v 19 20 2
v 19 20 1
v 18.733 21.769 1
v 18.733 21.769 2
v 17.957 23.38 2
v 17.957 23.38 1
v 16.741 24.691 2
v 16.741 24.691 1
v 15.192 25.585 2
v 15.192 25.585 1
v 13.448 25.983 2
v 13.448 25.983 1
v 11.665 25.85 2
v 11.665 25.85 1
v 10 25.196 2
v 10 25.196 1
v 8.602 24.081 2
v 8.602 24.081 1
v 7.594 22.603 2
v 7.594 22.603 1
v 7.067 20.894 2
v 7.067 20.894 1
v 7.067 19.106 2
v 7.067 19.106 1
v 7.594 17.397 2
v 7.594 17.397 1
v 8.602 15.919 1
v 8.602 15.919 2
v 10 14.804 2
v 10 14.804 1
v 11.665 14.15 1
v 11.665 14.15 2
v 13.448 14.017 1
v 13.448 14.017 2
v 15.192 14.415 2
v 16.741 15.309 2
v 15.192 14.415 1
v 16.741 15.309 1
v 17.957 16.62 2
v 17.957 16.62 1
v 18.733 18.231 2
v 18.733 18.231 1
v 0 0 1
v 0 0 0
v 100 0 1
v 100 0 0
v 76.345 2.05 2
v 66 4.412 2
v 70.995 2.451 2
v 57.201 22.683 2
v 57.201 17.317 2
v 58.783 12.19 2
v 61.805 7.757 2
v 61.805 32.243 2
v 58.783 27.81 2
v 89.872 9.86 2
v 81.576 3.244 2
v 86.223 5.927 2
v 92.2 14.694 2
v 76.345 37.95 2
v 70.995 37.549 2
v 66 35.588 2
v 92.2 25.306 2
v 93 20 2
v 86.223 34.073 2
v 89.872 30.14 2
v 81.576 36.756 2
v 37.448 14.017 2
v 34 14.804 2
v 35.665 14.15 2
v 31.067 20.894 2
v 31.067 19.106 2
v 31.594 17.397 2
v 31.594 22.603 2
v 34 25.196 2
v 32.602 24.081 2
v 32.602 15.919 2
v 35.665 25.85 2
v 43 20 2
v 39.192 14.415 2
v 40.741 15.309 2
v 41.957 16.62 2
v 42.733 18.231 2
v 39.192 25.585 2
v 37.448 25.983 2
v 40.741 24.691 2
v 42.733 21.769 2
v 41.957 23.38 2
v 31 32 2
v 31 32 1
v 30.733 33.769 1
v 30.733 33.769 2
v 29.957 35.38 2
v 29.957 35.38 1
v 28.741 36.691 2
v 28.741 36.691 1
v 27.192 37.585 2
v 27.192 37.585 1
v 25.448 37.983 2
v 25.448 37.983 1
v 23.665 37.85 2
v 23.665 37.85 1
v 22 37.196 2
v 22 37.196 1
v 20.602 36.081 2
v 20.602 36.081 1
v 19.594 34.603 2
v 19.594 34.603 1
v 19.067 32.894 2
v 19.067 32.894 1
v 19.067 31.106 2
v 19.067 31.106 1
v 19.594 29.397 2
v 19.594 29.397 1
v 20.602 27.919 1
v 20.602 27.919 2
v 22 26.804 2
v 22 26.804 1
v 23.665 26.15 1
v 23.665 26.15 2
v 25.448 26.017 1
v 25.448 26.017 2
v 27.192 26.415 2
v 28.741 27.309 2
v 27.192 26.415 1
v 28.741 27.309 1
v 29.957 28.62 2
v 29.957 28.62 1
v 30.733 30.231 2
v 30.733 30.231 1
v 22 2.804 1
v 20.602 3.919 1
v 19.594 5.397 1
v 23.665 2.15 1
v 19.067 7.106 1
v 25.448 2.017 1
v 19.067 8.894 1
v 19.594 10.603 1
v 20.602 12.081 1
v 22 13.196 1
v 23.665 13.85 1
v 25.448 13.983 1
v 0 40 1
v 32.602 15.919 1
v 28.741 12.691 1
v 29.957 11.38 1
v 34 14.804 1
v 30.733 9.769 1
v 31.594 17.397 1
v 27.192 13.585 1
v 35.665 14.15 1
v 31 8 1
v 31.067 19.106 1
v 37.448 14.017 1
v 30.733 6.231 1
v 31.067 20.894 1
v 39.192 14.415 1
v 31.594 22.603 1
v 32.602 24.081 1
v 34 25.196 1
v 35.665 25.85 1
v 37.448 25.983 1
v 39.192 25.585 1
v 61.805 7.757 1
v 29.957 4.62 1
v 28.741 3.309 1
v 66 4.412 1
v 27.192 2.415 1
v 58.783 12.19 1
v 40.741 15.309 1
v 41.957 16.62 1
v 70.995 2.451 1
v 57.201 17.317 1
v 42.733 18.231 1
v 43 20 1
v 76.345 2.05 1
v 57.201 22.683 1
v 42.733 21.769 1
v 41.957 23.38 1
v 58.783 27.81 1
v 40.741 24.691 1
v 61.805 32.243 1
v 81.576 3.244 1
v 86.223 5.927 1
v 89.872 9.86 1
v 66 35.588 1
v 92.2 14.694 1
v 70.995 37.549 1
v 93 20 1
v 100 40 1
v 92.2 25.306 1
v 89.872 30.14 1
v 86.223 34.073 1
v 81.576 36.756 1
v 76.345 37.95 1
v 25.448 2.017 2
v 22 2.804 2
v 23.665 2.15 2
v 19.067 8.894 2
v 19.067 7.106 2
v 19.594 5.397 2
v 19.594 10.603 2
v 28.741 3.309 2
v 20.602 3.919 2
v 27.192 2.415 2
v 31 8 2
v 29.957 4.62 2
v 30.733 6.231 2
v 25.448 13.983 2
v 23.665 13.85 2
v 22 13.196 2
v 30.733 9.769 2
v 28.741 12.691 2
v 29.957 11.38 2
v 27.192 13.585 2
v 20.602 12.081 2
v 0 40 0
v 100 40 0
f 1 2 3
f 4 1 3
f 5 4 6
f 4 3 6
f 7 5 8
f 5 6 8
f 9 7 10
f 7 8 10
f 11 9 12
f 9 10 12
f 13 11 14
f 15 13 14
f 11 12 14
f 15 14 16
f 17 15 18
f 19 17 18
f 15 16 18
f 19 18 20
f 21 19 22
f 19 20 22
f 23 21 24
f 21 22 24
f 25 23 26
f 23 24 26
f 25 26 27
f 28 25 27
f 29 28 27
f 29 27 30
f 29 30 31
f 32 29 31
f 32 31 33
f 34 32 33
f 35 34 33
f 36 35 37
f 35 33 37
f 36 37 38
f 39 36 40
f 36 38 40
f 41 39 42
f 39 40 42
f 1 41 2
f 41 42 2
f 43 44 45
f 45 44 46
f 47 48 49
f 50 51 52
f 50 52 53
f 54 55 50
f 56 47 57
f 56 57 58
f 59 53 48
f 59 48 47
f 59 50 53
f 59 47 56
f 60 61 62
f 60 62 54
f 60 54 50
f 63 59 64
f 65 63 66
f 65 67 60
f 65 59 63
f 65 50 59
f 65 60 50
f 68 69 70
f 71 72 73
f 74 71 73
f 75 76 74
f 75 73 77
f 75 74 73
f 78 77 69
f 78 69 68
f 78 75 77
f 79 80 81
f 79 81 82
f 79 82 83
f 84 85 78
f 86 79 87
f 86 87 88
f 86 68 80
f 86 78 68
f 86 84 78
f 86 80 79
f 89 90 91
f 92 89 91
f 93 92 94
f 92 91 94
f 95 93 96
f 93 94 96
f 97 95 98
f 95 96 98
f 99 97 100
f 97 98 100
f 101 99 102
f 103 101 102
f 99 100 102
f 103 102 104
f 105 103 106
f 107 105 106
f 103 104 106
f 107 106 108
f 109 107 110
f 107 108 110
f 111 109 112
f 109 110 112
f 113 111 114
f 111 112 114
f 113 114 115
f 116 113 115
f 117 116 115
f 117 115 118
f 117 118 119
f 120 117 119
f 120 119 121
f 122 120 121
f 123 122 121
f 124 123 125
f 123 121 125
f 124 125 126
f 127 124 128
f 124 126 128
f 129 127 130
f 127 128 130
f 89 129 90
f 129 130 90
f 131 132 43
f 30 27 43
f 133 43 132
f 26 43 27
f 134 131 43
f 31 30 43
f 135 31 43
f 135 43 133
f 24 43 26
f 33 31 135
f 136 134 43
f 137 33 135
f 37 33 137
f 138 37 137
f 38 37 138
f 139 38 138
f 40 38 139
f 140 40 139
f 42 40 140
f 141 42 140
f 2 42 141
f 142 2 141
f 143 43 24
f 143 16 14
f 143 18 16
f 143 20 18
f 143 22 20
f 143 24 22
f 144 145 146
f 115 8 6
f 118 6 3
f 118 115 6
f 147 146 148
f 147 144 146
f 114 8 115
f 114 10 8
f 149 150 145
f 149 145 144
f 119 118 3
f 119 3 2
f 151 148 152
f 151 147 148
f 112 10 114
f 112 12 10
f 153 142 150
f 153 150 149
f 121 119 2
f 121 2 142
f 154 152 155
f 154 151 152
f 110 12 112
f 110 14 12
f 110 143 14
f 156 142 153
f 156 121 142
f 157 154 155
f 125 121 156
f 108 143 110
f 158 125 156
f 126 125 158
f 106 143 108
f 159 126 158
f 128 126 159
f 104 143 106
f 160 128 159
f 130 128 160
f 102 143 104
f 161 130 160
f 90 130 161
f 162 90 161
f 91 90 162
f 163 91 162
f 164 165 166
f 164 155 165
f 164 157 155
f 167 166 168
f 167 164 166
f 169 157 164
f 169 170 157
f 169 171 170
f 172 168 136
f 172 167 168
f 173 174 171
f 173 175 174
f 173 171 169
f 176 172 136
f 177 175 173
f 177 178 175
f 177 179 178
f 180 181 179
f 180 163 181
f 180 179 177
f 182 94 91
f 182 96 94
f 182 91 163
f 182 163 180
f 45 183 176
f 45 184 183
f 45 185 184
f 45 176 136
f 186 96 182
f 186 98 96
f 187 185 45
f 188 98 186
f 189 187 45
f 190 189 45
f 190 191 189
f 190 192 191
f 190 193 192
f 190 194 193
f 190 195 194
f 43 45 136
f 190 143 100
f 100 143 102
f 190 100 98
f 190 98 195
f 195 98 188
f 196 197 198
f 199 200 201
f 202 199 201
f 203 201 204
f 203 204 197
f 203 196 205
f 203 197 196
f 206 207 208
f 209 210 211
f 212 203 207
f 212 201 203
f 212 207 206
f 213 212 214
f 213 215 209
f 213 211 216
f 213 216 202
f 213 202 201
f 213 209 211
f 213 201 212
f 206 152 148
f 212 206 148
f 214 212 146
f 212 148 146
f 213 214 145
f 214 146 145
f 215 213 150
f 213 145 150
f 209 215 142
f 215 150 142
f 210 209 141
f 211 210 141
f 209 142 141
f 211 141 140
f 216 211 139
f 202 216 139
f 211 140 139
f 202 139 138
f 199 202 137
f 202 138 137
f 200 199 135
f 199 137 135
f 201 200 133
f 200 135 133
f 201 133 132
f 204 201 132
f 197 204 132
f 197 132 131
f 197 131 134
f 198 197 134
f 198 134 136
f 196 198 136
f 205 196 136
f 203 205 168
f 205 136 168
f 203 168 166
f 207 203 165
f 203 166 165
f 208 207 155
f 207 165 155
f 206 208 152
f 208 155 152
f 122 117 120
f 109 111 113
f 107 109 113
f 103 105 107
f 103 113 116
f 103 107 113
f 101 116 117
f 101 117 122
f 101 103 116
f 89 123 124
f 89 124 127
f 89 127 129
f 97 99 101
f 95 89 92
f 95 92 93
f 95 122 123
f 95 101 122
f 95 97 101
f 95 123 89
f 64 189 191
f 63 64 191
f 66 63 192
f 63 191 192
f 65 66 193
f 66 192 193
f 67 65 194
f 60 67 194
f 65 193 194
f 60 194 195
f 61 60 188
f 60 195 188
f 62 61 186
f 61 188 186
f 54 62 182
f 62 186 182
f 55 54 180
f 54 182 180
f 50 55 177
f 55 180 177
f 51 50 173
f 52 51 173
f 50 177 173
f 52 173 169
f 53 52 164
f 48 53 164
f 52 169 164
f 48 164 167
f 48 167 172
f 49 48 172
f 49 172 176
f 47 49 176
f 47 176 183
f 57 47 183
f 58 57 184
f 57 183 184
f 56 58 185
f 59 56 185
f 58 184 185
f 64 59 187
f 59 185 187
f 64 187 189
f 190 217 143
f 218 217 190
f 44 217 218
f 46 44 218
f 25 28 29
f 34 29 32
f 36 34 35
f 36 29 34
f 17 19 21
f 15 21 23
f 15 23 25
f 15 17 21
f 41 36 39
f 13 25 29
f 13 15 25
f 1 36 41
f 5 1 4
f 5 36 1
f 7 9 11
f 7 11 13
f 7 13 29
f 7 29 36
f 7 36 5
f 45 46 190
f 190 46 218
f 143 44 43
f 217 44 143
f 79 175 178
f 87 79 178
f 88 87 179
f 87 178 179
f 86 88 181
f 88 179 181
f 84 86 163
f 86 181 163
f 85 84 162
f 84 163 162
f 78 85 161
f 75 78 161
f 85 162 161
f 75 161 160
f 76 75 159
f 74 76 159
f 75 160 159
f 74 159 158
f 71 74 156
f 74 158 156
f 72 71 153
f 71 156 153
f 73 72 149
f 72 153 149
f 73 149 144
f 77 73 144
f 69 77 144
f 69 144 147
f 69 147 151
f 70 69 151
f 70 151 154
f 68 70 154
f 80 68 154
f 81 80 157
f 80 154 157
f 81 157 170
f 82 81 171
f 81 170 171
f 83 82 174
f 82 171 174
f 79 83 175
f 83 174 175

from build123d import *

# Parameters (mm, degrees)
F0_W     = 100
F0_H     = 40
F1_DEPTH = 1
F2_R     = 6
F2_R_2   = 18
F3_DEPTH = 1


with BuildPart() as f1:
    # F0 (on Top) → F1 (new body)
    with BuildSketch(Plane.XY):
        with Locations((50, 20)):
            Rectangle(F0_W, F0_H)
    extrude(amount=F1_DEPTH)

    # F2 (on face) → F3 (join)
    with BuildSketch(Plane.XY.offset(1)):
        with Locations((13, 20)):
            Circle(F2_R)
        with Locations((25, 32)):
            Circle(F2_R)
        with Locations((37, 20)):
            Circle(F2_R)
        with Locations((75, 20)):
            Circle(F2_R_2)
        with Locations((25, 8)):
            Circle(F2_R)
    extrude(amount=F3_DEPTH)


solid = f1.part
